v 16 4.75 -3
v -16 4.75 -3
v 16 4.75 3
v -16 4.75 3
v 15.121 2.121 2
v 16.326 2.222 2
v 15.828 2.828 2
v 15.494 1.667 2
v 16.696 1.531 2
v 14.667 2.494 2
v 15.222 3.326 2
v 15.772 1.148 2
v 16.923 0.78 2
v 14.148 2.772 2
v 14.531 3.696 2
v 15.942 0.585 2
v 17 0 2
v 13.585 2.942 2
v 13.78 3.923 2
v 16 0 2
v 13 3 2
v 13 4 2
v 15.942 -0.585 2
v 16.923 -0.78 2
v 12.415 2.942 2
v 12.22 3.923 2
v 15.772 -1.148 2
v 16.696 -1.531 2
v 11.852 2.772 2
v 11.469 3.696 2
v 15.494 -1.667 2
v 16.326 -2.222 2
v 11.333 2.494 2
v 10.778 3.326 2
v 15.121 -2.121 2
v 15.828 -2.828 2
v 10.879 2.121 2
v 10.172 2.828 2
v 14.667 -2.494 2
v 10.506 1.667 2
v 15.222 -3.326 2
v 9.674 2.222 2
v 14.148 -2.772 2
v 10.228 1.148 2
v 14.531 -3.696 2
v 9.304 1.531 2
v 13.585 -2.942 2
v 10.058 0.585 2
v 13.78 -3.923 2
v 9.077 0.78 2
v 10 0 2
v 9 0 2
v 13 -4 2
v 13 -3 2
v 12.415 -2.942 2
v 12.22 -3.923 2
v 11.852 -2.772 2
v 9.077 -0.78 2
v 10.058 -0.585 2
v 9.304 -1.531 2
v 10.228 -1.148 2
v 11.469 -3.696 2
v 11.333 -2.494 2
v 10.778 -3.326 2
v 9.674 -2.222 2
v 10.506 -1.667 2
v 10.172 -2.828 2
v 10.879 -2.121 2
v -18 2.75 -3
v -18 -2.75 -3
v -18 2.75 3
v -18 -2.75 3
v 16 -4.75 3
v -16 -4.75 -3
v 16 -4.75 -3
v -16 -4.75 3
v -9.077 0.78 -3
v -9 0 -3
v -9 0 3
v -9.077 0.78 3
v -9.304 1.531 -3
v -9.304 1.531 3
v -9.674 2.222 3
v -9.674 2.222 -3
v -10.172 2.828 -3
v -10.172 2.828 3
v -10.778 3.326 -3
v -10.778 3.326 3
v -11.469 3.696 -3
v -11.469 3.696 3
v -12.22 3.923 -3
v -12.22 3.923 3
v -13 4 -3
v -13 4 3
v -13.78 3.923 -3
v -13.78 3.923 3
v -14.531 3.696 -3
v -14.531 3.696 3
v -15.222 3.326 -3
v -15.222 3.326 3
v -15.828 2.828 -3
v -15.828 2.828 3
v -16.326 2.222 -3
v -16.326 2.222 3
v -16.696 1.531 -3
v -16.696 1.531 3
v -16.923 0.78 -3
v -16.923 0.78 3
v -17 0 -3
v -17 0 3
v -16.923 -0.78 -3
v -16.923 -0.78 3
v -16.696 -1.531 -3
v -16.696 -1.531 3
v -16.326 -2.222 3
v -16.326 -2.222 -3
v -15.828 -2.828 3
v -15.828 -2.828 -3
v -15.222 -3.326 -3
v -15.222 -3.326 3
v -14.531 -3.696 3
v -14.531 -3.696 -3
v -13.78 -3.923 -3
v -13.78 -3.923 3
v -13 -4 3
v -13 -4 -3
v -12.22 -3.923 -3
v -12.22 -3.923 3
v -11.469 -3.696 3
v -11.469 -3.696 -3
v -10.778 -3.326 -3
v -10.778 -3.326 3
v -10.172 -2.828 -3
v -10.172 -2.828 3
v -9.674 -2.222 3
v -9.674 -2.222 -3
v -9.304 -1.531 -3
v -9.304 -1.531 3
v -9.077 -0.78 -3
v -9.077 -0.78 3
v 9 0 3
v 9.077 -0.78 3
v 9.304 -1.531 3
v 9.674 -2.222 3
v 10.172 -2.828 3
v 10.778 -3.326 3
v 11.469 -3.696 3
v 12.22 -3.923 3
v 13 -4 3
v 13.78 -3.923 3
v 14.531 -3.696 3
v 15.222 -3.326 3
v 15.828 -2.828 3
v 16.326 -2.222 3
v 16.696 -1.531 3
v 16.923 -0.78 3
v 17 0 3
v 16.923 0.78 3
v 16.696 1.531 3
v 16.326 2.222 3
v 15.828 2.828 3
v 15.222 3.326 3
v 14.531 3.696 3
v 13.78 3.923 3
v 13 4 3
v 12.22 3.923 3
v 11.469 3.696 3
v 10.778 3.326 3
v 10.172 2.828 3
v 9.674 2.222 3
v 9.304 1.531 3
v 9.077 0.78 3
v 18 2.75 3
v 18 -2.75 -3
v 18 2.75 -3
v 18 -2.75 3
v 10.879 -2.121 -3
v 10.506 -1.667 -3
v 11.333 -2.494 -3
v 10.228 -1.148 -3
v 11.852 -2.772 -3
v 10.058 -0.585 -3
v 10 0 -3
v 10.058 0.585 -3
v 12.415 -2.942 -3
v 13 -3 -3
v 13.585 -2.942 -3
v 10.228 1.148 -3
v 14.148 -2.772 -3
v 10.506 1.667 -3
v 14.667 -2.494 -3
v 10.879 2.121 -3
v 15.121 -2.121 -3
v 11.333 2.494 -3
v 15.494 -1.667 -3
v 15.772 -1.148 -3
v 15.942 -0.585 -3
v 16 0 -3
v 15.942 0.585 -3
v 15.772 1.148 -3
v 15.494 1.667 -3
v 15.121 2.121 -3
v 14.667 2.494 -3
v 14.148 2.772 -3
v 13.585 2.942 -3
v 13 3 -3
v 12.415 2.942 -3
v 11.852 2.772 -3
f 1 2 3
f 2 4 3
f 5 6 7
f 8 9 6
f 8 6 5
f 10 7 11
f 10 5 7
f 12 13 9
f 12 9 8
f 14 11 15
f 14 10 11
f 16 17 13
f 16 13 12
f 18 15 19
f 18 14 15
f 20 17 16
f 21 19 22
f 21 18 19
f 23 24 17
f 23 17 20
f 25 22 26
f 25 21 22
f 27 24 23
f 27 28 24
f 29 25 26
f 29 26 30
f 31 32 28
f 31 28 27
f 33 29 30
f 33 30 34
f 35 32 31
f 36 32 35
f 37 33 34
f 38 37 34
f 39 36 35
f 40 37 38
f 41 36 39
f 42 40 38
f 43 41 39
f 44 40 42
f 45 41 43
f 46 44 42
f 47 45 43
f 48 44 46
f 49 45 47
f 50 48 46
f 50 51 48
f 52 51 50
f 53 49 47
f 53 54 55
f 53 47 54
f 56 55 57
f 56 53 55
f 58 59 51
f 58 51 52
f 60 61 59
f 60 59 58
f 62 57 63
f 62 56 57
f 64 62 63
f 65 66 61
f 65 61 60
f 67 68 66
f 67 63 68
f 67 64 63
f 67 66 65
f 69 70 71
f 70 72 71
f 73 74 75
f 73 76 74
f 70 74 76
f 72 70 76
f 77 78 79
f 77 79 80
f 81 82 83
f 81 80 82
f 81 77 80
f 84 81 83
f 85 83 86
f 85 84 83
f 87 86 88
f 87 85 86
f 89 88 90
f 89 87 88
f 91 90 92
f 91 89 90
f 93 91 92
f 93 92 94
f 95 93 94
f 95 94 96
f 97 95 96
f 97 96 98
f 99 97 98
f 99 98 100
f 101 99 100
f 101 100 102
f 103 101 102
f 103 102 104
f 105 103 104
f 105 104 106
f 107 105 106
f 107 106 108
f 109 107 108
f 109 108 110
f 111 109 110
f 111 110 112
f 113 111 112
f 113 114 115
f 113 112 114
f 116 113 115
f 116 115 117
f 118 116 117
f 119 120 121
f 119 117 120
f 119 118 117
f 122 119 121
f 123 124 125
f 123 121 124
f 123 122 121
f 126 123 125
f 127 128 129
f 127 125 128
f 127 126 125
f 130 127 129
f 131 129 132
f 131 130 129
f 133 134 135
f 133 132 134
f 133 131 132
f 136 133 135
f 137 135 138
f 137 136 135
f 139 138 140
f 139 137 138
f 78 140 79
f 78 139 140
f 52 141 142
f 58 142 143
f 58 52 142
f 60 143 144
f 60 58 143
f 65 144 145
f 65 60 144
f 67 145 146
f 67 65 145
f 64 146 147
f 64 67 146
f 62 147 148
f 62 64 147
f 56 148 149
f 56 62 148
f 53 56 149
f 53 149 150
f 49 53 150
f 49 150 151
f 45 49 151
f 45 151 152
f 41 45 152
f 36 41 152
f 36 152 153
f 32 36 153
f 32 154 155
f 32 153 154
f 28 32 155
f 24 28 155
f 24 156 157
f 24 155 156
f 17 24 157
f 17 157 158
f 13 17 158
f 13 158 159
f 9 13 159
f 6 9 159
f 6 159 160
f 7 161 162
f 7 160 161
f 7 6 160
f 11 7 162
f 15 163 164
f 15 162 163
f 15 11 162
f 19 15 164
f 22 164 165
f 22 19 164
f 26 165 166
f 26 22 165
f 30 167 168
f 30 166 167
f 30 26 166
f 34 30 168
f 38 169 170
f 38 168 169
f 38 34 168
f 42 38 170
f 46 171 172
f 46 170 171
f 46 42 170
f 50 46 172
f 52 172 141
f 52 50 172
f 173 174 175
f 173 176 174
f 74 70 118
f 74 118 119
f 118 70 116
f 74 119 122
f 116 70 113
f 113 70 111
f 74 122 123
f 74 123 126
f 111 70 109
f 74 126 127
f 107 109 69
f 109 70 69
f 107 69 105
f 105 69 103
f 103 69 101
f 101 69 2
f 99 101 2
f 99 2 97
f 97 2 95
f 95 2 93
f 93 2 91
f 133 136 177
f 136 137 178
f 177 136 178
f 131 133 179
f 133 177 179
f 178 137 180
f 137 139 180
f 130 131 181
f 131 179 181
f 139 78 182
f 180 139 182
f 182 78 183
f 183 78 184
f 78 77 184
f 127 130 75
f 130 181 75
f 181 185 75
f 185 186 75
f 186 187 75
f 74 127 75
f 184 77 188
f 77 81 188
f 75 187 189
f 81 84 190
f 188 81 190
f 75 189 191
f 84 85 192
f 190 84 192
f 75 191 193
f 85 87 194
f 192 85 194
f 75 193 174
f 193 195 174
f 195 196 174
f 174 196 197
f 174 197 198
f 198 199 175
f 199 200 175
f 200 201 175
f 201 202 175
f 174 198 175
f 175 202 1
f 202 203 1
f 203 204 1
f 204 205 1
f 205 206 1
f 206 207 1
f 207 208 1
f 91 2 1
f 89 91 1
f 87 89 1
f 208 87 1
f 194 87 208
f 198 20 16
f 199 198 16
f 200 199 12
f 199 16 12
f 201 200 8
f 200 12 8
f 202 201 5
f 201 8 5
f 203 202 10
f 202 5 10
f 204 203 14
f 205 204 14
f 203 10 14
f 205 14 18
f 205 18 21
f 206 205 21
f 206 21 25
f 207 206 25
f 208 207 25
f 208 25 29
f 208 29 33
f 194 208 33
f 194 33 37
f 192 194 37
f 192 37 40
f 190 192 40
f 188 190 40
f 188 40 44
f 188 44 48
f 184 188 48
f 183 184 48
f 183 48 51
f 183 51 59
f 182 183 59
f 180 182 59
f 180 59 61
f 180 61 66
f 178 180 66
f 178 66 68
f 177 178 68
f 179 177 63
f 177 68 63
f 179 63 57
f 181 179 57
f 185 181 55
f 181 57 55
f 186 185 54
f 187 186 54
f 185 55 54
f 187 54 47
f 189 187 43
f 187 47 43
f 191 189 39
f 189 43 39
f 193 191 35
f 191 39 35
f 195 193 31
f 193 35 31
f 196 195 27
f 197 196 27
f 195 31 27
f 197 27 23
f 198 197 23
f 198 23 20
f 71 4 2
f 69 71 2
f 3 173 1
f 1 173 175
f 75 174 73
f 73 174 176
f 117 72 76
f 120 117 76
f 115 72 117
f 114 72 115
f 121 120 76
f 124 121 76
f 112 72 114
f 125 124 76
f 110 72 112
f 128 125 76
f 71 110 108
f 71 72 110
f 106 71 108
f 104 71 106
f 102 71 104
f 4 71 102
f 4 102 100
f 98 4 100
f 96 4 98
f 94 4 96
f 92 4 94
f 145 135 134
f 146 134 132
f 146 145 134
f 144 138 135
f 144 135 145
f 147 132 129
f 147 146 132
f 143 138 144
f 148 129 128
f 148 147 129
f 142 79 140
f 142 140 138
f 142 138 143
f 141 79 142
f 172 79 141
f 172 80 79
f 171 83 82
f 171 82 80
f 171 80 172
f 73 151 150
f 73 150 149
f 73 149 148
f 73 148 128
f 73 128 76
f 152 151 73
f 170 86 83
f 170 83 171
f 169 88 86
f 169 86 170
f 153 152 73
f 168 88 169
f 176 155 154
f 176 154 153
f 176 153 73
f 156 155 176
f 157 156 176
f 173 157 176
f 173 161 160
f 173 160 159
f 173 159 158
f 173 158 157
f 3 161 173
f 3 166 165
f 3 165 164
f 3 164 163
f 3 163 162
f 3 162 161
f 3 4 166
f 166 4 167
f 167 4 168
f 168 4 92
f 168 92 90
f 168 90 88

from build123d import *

# Parameters (mm, degrees)
SKETCH_1_W               = 36
SKETCH_1_H               = 9.5
EXTRUDE_1_DEPTH          = 3
CUT_EXTRUDE_1_DEPTH      = 20.559204994
CUT_EXTRUDE_1_DEPTH_BACK = 20.559204994
SKETCH_2_R               = 4
CUT_EXTRUDE_2_DEPTH      = 20.559204994
CUT_EXTRUDE_2_DEPTH_BACK = 1
SKETCH_3_R               = 4
SKETCH_4_R               = 3
CUT_EXTRUDE_3_DEPTH      = 20.275956526
CHAMFER_1_SIZE           = 2


with BuildPart() as part:
    # 草图1 → 凸台-拉伸1 (new, symmetric)
    with BuildSketch(Plane.XY):
        Rectangle(SKETCH_1_W, SKETCH_1_H)
    extrude(amount=EXTRUDE_1_DEPTH, both=True)

    # 草图2 → 切除-拉伸1 (cut, two sides: drawn at the far end of the back side and taken through both)
    with BuildSketch(Plane.XY.offset(3).offset(-CUT_EXTRUDE_1_DEPTH_BACK)):
        with Locations((-13, 0)):
            Circle(SKETCH_2_R)
    extrude(amount=CUT_EXTRUDE_1_DEPTH + CUT_EXTRUDE_1_DEPTH_BACK, mode=Mode.SUBTRACT)

    # 草图3 → 切除-拉伸2 (cut, two sides: drawn at the far end of the back side and taken through both)
    with BuildSketch(Plane.XY.offset(3).offset(-CUT_EXTRUDE_2_DEPTH_BACK)):
        with Locations(Location((13, 0, 0), (0, 0, 180))):
            Circle(SKETCH_3_R)
    extrude(amount=CUT_EXTRUDE_2_DEPTH + CUT_EXTRUDE_2_DEPTH_BACK, mode=Mode.SUBTRACT)

    # 草图4 → 切除-拉伸3 (cut, through all)
    with BuildSketch(Plane.XY.offset(2)):
        with Locations((13, 0)):
            Circle(SKETCH_4_R)
    extrude(amount=-CUT_EXTRUDE_3_DEPTH, mode=Mode.SUBTRACT)

    # 倒角1
    chamfer_1_edges = [part.edges().sort_by_distance(p)[0] for p in [
        (18, -4.75, 0),
        (-18, -4.75, 0),
        (-18, 4.75, 0),
        (18, 4.75, 0),
    ]]
    chamfer(chamfer_1_edges, length=CHAMFER_1_SIZE)


solid = part.part
